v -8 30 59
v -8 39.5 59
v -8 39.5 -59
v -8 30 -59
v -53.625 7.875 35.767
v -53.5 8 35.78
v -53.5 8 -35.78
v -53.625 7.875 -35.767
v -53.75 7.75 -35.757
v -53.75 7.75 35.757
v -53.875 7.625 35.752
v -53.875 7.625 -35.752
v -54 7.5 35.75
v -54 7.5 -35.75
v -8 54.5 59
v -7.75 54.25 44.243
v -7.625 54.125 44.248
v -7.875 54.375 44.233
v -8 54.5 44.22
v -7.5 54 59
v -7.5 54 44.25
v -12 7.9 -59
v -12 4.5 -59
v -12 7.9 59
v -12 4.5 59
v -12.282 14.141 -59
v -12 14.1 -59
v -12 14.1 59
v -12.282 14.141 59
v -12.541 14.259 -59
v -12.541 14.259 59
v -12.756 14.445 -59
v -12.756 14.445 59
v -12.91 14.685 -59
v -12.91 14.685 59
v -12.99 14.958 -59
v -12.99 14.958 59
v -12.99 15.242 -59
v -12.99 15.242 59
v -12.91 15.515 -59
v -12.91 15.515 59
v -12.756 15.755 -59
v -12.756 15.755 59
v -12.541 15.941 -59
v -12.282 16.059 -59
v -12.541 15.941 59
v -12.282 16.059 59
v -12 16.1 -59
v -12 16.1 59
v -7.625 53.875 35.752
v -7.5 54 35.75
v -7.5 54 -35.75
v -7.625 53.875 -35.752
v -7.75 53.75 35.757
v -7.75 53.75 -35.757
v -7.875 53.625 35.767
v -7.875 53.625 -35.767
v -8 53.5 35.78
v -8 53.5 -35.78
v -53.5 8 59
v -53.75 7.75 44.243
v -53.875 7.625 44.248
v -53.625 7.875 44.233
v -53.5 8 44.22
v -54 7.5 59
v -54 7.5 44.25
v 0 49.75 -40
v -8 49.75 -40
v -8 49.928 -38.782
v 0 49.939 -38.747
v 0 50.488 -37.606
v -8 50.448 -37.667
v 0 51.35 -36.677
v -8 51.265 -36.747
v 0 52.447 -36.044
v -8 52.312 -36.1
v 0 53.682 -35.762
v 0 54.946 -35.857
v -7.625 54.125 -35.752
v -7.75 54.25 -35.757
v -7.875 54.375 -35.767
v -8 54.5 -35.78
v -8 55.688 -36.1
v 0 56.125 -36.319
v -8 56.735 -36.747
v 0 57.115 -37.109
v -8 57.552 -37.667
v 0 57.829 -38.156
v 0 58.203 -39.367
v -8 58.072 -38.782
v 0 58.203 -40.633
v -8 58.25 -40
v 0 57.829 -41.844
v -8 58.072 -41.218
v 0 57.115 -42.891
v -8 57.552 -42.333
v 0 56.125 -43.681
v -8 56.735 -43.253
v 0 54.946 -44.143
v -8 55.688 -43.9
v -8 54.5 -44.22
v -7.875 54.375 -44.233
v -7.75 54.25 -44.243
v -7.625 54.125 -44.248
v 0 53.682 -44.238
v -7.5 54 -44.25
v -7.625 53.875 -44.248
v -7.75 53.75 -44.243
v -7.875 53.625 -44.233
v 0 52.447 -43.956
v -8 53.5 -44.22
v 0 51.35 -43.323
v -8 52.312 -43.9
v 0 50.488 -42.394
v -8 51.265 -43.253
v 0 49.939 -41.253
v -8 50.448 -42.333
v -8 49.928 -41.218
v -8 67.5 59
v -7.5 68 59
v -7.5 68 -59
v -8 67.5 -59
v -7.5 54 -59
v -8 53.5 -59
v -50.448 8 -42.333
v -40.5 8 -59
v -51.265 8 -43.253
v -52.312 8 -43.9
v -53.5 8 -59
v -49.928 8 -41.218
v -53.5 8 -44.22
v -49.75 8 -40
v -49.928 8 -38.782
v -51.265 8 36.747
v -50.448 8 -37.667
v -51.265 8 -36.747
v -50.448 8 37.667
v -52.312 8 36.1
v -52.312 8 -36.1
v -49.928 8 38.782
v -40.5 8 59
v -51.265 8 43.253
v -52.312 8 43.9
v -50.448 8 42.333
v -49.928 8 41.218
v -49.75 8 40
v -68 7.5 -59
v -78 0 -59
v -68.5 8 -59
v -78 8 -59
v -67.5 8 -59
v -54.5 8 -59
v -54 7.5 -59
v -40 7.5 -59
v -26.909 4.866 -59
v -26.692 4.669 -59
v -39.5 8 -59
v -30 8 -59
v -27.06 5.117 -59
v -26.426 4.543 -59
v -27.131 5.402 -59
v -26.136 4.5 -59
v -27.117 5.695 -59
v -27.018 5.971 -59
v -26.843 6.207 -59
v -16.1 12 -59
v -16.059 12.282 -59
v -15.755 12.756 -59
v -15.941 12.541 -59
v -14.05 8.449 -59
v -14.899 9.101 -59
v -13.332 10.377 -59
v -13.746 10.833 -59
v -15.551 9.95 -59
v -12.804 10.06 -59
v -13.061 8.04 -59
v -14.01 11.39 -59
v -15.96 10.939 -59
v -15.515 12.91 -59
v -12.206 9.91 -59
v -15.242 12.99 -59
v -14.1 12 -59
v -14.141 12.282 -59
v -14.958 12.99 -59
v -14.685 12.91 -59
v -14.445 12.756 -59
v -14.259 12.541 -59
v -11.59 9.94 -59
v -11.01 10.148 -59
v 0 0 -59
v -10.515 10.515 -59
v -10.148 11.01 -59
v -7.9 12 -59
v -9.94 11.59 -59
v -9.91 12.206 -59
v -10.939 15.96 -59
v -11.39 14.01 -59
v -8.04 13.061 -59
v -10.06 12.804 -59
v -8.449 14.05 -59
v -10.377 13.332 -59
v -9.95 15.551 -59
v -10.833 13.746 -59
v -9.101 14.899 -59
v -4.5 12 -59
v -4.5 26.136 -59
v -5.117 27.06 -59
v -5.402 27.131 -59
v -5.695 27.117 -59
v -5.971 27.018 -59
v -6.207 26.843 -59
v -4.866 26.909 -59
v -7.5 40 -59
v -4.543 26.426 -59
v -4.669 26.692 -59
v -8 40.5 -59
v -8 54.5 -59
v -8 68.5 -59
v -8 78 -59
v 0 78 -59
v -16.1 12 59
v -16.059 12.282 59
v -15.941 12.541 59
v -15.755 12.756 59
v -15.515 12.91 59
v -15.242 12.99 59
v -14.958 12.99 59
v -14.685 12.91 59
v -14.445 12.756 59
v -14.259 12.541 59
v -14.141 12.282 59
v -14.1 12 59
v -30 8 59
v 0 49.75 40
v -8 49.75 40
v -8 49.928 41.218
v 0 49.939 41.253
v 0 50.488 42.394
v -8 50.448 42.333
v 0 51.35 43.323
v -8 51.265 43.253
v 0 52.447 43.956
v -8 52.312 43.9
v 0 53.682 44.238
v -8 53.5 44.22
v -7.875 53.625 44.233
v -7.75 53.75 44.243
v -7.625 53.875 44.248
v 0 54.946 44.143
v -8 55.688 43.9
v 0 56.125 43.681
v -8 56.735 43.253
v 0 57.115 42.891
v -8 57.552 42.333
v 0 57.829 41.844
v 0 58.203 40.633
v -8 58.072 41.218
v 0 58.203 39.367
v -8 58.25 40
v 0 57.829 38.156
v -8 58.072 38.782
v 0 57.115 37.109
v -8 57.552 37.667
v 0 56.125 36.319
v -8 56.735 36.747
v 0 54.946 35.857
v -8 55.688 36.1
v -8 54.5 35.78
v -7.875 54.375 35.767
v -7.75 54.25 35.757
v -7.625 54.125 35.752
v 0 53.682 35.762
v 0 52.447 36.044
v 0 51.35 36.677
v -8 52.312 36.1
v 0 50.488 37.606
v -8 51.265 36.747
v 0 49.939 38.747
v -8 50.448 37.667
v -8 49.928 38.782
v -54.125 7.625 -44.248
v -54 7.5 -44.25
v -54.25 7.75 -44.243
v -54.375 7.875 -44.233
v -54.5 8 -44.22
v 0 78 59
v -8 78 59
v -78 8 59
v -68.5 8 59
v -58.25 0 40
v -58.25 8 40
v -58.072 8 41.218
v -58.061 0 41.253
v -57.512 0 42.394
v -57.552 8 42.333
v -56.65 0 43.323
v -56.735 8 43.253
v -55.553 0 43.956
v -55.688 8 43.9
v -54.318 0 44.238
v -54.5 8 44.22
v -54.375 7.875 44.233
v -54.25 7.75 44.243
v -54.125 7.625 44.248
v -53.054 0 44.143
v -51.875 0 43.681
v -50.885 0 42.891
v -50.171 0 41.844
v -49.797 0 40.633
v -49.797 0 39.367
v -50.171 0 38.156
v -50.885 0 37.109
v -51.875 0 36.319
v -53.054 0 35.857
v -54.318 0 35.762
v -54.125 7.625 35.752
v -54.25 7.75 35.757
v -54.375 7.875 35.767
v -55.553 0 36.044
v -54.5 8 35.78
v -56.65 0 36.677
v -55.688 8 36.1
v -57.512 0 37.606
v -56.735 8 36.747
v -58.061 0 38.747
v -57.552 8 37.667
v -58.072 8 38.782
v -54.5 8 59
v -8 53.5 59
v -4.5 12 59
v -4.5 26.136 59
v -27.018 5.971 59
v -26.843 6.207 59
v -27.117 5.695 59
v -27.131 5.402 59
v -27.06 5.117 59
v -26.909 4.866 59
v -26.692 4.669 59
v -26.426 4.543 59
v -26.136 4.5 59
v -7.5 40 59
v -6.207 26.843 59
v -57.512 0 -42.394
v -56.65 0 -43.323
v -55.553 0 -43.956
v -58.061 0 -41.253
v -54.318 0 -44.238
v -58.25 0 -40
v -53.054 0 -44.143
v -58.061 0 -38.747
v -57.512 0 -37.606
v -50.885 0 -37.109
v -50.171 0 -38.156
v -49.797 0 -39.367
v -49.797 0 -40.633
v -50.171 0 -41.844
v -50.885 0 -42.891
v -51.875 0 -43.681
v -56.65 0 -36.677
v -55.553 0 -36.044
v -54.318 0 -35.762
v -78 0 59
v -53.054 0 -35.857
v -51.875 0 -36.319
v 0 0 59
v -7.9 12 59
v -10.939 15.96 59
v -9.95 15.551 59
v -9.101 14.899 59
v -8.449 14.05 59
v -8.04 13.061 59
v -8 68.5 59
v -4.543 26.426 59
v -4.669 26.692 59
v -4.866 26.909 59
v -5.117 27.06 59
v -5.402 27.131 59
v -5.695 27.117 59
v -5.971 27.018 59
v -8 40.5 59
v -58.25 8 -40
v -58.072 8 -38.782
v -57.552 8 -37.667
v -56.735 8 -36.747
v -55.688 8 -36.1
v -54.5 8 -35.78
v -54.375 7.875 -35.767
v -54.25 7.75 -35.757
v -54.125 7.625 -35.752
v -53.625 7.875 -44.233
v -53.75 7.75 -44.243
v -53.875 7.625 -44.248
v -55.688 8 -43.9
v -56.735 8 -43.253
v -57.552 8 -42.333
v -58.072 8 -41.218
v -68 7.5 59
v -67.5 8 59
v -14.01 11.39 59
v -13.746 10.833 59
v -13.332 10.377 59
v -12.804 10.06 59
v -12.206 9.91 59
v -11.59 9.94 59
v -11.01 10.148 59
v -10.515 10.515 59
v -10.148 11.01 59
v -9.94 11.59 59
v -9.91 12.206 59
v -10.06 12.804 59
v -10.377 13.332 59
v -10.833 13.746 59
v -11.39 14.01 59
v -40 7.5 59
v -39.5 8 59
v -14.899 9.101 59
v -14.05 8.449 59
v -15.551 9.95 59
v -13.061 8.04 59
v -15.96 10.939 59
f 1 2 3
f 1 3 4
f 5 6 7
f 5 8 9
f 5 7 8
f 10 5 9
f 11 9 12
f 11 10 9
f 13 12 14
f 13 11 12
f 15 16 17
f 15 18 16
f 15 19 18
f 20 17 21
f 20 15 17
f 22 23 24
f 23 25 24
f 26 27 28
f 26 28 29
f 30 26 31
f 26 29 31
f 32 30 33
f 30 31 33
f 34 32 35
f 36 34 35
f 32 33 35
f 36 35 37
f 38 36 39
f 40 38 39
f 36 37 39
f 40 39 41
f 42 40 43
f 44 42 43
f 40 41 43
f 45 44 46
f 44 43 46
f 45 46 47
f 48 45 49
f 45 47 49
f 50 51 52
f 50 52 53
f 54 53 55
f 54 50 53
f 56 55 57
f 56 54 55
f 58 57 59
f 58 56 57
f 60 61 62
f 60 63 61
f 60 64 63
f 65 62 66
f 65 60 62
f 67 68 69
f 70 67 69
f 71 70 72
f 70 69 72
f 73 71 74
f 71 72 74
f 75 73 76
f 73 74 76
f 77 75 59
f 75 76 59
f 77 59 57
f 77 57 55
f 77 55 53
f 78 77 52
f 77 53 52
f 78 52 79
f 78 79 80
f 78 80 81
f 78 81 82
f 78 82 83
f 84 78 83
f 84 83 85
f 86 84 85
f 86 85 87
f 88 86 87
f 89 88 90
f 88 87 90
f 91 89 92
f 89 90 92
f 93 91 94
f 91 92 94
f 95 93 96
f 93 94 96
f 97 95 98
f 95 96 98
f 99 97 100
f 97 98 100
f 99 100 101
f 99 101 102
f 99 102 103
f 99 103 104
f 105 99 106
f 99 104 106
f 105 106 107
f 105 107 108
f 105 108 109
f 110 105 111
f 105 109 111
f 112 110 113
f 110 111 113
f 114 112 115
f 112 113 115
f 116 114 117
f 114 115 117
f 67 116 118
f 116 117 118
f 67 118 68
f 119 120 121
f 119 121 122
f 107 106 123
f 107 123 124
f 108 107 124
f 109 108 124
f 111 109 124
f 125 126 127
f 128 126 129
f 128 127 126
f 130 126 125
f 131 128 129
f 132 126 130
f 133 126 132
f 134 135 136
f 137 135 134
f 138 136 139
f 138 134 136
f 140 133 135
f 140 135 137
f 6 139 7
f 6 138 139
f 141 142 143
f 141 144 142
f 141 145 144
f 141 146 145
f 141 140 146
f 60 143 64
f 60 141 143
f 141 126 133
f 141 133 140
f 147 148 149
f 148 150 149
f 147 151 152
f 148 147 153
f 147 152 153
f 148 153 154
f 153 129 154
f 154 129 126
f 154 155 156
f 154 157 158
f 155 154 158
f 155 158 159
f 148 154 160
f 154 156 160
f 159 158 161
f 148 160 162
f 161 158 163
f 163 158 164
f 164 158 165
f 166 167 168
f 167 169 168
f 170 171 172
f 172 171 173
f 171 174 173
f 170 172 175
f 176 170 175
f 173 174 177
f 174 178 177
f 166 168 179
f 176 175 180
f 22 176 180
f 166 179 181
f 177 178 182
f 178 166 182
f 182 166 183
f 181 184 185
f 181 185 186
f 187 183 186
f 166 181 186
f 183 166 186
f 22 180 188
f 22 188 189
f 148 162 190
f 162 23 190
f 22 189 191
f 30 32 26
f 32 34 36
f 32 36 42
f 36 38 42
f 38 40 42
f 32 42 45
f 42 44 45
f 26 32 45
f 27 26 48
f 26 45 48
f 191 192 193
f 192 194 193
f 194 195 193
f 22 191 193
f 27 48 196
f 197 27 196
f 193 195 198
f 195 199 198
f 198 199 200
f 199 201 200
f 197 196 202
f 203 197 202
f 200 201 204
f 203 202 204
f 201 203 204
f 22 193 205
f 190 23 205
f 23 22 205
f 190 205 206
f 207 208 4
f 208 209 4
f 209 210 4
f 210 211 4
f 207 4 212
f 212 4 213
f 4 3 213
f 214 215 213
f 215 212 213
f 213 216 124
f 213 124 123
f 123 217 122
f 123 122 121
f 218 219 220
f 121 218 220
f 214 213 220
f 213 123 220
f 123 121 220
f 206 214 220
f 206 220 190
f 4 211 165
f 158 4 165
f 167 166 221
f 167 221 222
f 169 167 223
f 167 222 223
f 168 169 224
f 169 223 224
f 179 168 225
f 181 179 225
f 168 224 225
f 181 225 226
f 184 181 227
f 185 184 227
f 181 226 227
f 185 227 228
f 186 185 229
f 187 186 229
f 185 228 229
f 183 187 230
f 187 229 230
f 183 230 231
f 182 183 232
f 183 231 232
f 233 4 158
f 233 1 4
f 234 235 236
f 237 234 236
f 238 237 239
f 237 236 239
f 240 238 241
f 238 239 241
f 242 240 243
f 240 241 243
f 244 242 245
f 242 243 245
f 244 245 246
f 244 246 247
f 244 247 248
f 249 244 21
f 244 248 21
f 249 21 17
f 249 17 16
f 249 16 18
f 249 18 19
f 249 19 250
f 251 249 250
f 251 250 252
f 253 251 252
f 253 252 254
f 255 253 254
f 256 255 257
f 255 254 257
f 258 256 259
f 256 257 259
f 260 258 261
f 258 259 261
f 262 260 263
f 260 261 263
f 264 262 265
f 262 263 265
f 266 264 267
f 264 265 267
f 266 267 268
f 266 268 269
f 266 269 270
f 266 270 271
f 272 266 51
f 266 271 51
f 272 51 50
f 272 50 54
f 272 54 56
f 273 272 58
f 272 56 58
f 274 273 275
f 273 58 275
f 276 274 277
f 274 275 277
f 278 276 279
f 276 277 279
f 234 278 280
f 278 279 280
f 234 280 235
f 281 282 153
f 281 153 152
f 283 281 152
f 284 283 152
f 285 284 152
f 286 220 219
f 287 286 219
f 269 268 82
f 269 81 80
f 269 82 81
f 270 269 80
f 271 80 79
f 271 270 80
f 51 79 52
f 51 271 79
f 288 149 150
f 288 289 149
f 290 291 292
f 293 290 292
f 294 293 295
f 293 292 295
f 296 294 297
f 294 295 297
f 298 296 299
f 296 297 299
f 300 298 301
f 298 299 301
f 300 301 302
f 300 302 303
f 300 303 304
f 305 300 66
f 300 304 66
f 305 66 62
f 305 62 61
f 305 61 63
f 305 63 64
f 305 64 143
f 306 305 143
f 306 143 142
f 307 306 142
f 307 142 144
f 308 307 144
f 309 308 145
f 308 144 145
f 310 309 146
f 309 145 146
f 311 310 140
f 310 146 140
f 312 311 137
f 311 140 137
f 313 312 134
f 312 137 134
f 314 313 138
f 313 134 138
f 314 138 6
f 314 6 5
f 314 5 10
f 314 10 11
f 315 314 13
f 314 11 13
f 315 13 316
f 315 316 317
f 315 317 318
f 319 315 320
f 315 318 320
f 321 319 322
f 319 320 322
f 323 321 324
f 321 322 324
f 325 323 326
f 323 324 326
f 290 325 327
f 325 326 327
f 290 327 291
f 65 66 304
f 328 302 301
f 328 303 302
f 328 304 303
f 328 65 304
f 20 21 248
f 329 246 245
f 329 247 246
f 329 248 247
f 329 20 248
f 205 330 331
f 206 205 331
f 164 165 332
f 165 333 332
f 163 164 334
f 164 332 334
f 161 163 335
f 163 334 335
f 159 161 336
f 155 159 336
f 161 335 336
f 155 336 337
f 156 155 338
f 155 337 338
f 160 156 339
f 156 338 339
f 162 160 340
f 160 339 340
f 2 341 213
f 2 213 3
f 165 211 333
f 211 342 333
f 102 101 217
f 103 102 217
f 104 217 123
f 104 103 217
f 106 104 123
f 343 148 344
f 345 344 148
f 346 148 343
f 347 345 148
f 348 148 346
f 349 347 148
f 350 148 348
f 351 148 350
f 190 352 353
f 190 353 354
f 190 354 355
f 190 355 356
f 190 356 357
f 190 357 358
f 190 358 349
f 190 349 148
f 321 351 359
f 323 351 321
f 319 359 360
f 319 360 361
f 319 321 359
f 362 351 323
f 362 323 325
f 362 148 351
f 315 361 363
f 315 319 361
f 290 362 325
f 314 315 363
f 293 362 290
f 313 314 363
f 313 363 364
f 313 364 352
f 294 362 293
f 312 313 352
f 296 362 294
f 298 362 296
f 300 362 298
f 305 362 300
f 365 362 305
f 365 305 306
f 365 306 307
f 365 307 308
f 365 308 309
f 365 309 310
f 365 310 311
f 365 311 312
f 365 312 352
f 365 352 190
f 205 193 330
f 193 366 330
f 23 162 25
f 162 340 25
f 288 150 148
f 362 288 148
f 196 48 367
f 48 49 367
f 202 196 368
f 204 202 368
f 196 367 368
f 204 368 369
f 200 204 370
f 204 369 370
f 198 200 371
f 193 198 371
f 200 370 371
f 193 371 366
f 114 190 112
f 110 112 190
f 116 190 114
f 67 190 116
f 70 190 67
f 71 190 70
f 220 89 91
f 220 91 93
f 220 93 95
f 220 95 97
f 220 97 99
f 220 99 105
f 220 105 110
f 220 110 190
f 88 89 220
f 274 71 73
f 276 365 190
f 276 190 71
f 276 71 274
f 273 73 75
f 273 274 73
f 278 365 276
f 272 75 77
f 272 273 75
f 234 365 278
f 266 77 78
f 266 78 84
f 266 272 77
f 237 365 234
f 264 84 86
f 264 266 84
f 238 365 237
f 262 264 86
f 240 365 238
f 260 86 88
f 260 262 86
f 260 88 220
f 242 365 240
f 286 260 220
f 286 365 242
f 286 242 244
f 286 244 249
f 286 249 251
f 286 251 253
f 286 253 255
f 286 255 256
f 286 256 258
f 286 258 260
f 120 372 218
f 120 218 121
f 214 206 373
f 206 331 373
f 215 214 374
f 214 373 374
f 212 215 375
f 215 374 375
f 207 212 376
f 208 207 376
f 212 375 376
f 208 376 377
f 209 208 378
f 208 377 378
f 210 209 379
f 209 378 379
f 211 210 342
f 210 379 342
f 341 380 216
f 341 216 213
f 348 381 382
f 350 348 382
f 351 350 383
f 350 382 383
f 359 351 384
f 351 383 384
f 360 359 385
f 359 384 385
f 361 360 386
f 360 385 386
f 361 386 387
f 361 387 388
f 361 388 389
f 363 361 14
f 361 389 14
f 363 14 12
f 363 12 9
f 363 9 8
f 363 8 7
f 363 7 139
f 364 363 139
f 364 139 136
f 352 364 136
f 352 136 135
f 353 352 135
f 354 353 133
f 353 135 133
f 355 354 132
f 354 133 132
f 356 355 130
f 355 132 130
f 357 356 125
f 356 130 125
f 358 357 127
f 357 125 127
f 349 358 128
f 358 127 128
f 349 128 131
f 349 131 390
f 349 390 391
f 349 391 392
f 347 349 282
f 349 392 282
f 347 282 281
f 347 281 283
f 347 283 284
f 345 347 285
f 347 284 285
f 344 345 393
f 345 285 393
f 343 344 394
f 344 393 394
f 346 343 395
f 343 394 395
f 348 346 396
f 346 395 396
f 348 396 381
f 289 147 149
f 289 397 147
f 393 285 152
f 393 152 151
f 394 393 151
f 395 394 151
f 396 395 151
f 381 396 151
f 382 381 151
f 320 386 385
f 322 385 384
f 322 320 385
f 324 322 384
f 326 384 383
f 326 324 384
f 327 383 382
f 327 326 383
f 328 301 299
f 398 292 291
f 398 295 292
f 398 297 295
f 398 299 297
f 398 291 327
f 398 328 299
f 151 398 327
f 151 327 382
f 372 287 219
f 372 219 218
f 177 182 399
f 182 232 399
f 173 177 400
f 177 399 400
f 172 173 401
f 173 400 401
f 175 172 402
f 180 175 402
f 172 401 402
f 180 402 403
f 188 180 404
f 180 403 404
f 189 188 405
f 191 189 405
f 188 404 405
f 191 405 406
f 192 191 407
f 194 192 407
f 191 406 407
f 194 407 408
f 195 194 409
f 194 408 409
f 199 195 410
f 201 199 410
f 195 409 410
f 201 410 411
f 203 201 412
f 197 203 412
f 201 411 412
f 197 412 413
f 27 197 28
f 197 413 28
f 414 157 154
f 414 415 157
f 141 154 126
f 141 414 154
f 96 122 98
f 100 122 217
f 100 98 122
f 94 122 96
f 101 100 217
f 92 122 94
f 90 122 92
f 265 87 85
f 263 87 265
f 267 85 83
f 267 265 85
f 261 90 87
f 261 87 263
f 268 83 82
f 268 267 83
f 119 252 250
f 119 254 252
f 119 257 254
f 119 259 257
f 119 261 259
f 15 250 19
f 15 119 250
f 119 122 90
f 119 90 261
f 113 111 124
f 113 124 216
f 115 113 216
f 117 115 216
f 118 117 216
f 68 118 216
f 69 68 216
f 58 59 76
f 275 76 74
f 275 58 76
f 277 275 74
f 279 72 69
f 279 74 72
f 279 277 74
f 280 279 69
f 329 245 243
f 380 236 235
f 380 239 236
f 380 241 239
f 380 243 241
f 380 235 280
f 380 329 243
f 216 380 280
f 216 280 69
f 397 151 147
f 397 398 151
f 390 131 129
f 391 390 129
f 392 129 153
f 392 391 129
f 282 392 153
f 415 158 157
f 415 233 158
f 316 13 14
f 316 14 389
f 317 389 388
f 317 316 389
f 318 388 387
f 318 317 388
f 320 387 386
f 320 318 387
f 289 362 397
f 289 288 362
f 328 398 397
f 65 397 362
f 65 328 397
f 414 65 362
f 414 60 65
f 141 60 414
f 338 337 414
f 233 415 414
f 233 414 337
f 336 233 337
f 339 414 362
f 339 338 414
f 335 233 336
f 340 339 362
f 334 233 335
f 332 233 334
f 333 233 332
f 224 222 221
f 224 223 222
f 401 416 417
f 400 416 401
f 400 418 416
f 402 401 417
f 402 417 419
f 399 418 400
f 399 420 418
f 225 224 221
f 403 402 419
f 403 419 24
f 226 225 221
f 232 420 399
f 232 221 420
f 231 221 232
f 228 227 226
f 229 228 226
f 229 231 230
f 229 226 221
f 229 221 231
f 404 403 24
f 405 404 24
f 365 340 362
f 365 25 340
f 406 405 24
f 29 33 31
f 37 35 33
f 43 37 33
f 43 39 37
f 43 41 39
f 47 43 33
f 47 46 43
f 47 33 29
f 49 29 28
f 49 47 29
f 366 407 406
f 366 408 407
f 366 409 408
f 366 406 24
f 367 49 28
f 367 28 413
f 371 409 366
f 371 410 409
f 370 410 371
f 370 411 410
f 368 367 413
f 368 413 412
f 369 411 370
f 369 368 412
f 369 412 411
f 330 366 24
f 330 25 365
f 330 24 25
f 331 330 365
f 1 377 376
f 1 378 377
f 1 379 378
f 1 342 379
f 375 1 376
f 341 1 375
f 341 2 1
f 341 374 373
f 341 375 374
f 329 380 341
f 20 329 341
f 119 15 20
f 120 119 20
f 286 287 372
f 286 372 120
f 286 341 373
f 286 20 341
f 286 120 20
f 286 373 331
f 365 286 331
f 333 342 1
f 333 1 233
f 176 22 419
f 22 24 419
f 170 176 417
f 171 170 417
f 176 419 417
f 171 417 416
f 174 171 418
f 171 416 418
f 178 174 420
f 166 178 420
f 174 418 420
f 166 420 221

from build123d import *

# Parameters (mm, degrees)
EXTRUDE_1_DEPTH     = 59
SKETCH_2_R          = 4.25
CUT_EXTRUDE_1_DEPTH = 9
SKETCH_3_R          = 4.25
CUT_EXTRUDE_2_DEPTH = 9


with BuildPart() as part:
    # Эскиз1 → Бобышка-Вытянуть1 (new body, symmetric)
    with BuildSketch(Plane.XY):
        Polygon((-78, 0), (0, 0), (0, 78), (-8, 78), (-8, 68.5), (-7.5, 68), (-8, 67.5), (-8, 54.5), (-7.5, 54), (-8, 53.5), (-8, 40.5), (-7.5, 40), (-8, 39.5), (-8, 30), (-30, 8), (-39.5, 8), (-40, 7.5), (-40.5, 8), (-53.5, 8), (-54, 7.5), (-54.5, 8), (-67.5, 8), (-68, 7.5), (-68.5, 8), (-78, 8), align=None)
        with BuildLine():
            Line((-4.5, 12), (-4.5, 26.136038969))
            ThreePointArc((-4.5, 26.136038969), (-5.117316568, 27.059918502), (-6.207106781, 26.843145751))
            Line((-6.207106781, 26.843145751), (-26.843145751, 6.207106781))
            ThreePointArc((-26.843145751, 6.207106781), (-27.059918502, 5.117316568), (-26.136038969, 4.5))
            Line((-26.136038969, 4.5), (-12, 4.5))
            Line((-12, 4.5), (-12, 7.9))
            ThreePointArc((-12, 7.9), (-14.899137803, 9.100862197), (-16.1, 12))
            ThreePointArc((-16.1, 12), (-15.1, 13), (-14.1, 12))
            ThreePointArc((-14.1, 12), (-10.51507576, 10.51507576), (-12, 14.1))
            ThreePointArc((-12, 14.1), (-13, 15.1), (-12, 16.1))
            ThreePointArc((-12, 16.1), (-9.100862197, 14.899137803), (-7.9, 12))
            Line((-7.9, 12), (-4.5, 12))
        make_face(mode=Mode.SUBTRACT)
    extrude(amount=EXTRUDE_1_DEPTH, both=True)

    # Эскиз2 → Вырез-Вытянуть1 (cut, through all)
    with BuildSketch(Plane.ZY.offset(8)):
        with Locations(Location((-40, 54, 0), (0, 0, 270))):  # turned: the seam where the file's is
            Circle(SKETCH_2_R)
        with Locations(Location((40, 54, 0), (0, 0, 270))):  # turned: the seam where the file's is
            Circle(SKETCH_2_R)
    extrude(amount=-CUT_EXTRUDE_1_DEPTH, mode=Mode.SUBTRACT)

    # Эскиз3 → Вырез-Вытянуть2 (cut, through all)
    with BuildSketch(Plane(origin=(0, 8, 0), x_dir=(1, 0, 0), z_dir=(0, 1, 0))):
        with Locations(Location((-54, -40, 0), (0, 0, 180))):  # turned: the seam where the file's is
            Circle(SKETCH_3_R)
        with Locations(Location((-54, 40, 0), (0, 0, 180))):  # turned: the seam where the file's is
            Circle(SKETCH_3_R)
    extrude(amount=-CUT_EXTRUDE_2_DEPTH, mode=Mode.SUBTRACT)


solid = part.part
